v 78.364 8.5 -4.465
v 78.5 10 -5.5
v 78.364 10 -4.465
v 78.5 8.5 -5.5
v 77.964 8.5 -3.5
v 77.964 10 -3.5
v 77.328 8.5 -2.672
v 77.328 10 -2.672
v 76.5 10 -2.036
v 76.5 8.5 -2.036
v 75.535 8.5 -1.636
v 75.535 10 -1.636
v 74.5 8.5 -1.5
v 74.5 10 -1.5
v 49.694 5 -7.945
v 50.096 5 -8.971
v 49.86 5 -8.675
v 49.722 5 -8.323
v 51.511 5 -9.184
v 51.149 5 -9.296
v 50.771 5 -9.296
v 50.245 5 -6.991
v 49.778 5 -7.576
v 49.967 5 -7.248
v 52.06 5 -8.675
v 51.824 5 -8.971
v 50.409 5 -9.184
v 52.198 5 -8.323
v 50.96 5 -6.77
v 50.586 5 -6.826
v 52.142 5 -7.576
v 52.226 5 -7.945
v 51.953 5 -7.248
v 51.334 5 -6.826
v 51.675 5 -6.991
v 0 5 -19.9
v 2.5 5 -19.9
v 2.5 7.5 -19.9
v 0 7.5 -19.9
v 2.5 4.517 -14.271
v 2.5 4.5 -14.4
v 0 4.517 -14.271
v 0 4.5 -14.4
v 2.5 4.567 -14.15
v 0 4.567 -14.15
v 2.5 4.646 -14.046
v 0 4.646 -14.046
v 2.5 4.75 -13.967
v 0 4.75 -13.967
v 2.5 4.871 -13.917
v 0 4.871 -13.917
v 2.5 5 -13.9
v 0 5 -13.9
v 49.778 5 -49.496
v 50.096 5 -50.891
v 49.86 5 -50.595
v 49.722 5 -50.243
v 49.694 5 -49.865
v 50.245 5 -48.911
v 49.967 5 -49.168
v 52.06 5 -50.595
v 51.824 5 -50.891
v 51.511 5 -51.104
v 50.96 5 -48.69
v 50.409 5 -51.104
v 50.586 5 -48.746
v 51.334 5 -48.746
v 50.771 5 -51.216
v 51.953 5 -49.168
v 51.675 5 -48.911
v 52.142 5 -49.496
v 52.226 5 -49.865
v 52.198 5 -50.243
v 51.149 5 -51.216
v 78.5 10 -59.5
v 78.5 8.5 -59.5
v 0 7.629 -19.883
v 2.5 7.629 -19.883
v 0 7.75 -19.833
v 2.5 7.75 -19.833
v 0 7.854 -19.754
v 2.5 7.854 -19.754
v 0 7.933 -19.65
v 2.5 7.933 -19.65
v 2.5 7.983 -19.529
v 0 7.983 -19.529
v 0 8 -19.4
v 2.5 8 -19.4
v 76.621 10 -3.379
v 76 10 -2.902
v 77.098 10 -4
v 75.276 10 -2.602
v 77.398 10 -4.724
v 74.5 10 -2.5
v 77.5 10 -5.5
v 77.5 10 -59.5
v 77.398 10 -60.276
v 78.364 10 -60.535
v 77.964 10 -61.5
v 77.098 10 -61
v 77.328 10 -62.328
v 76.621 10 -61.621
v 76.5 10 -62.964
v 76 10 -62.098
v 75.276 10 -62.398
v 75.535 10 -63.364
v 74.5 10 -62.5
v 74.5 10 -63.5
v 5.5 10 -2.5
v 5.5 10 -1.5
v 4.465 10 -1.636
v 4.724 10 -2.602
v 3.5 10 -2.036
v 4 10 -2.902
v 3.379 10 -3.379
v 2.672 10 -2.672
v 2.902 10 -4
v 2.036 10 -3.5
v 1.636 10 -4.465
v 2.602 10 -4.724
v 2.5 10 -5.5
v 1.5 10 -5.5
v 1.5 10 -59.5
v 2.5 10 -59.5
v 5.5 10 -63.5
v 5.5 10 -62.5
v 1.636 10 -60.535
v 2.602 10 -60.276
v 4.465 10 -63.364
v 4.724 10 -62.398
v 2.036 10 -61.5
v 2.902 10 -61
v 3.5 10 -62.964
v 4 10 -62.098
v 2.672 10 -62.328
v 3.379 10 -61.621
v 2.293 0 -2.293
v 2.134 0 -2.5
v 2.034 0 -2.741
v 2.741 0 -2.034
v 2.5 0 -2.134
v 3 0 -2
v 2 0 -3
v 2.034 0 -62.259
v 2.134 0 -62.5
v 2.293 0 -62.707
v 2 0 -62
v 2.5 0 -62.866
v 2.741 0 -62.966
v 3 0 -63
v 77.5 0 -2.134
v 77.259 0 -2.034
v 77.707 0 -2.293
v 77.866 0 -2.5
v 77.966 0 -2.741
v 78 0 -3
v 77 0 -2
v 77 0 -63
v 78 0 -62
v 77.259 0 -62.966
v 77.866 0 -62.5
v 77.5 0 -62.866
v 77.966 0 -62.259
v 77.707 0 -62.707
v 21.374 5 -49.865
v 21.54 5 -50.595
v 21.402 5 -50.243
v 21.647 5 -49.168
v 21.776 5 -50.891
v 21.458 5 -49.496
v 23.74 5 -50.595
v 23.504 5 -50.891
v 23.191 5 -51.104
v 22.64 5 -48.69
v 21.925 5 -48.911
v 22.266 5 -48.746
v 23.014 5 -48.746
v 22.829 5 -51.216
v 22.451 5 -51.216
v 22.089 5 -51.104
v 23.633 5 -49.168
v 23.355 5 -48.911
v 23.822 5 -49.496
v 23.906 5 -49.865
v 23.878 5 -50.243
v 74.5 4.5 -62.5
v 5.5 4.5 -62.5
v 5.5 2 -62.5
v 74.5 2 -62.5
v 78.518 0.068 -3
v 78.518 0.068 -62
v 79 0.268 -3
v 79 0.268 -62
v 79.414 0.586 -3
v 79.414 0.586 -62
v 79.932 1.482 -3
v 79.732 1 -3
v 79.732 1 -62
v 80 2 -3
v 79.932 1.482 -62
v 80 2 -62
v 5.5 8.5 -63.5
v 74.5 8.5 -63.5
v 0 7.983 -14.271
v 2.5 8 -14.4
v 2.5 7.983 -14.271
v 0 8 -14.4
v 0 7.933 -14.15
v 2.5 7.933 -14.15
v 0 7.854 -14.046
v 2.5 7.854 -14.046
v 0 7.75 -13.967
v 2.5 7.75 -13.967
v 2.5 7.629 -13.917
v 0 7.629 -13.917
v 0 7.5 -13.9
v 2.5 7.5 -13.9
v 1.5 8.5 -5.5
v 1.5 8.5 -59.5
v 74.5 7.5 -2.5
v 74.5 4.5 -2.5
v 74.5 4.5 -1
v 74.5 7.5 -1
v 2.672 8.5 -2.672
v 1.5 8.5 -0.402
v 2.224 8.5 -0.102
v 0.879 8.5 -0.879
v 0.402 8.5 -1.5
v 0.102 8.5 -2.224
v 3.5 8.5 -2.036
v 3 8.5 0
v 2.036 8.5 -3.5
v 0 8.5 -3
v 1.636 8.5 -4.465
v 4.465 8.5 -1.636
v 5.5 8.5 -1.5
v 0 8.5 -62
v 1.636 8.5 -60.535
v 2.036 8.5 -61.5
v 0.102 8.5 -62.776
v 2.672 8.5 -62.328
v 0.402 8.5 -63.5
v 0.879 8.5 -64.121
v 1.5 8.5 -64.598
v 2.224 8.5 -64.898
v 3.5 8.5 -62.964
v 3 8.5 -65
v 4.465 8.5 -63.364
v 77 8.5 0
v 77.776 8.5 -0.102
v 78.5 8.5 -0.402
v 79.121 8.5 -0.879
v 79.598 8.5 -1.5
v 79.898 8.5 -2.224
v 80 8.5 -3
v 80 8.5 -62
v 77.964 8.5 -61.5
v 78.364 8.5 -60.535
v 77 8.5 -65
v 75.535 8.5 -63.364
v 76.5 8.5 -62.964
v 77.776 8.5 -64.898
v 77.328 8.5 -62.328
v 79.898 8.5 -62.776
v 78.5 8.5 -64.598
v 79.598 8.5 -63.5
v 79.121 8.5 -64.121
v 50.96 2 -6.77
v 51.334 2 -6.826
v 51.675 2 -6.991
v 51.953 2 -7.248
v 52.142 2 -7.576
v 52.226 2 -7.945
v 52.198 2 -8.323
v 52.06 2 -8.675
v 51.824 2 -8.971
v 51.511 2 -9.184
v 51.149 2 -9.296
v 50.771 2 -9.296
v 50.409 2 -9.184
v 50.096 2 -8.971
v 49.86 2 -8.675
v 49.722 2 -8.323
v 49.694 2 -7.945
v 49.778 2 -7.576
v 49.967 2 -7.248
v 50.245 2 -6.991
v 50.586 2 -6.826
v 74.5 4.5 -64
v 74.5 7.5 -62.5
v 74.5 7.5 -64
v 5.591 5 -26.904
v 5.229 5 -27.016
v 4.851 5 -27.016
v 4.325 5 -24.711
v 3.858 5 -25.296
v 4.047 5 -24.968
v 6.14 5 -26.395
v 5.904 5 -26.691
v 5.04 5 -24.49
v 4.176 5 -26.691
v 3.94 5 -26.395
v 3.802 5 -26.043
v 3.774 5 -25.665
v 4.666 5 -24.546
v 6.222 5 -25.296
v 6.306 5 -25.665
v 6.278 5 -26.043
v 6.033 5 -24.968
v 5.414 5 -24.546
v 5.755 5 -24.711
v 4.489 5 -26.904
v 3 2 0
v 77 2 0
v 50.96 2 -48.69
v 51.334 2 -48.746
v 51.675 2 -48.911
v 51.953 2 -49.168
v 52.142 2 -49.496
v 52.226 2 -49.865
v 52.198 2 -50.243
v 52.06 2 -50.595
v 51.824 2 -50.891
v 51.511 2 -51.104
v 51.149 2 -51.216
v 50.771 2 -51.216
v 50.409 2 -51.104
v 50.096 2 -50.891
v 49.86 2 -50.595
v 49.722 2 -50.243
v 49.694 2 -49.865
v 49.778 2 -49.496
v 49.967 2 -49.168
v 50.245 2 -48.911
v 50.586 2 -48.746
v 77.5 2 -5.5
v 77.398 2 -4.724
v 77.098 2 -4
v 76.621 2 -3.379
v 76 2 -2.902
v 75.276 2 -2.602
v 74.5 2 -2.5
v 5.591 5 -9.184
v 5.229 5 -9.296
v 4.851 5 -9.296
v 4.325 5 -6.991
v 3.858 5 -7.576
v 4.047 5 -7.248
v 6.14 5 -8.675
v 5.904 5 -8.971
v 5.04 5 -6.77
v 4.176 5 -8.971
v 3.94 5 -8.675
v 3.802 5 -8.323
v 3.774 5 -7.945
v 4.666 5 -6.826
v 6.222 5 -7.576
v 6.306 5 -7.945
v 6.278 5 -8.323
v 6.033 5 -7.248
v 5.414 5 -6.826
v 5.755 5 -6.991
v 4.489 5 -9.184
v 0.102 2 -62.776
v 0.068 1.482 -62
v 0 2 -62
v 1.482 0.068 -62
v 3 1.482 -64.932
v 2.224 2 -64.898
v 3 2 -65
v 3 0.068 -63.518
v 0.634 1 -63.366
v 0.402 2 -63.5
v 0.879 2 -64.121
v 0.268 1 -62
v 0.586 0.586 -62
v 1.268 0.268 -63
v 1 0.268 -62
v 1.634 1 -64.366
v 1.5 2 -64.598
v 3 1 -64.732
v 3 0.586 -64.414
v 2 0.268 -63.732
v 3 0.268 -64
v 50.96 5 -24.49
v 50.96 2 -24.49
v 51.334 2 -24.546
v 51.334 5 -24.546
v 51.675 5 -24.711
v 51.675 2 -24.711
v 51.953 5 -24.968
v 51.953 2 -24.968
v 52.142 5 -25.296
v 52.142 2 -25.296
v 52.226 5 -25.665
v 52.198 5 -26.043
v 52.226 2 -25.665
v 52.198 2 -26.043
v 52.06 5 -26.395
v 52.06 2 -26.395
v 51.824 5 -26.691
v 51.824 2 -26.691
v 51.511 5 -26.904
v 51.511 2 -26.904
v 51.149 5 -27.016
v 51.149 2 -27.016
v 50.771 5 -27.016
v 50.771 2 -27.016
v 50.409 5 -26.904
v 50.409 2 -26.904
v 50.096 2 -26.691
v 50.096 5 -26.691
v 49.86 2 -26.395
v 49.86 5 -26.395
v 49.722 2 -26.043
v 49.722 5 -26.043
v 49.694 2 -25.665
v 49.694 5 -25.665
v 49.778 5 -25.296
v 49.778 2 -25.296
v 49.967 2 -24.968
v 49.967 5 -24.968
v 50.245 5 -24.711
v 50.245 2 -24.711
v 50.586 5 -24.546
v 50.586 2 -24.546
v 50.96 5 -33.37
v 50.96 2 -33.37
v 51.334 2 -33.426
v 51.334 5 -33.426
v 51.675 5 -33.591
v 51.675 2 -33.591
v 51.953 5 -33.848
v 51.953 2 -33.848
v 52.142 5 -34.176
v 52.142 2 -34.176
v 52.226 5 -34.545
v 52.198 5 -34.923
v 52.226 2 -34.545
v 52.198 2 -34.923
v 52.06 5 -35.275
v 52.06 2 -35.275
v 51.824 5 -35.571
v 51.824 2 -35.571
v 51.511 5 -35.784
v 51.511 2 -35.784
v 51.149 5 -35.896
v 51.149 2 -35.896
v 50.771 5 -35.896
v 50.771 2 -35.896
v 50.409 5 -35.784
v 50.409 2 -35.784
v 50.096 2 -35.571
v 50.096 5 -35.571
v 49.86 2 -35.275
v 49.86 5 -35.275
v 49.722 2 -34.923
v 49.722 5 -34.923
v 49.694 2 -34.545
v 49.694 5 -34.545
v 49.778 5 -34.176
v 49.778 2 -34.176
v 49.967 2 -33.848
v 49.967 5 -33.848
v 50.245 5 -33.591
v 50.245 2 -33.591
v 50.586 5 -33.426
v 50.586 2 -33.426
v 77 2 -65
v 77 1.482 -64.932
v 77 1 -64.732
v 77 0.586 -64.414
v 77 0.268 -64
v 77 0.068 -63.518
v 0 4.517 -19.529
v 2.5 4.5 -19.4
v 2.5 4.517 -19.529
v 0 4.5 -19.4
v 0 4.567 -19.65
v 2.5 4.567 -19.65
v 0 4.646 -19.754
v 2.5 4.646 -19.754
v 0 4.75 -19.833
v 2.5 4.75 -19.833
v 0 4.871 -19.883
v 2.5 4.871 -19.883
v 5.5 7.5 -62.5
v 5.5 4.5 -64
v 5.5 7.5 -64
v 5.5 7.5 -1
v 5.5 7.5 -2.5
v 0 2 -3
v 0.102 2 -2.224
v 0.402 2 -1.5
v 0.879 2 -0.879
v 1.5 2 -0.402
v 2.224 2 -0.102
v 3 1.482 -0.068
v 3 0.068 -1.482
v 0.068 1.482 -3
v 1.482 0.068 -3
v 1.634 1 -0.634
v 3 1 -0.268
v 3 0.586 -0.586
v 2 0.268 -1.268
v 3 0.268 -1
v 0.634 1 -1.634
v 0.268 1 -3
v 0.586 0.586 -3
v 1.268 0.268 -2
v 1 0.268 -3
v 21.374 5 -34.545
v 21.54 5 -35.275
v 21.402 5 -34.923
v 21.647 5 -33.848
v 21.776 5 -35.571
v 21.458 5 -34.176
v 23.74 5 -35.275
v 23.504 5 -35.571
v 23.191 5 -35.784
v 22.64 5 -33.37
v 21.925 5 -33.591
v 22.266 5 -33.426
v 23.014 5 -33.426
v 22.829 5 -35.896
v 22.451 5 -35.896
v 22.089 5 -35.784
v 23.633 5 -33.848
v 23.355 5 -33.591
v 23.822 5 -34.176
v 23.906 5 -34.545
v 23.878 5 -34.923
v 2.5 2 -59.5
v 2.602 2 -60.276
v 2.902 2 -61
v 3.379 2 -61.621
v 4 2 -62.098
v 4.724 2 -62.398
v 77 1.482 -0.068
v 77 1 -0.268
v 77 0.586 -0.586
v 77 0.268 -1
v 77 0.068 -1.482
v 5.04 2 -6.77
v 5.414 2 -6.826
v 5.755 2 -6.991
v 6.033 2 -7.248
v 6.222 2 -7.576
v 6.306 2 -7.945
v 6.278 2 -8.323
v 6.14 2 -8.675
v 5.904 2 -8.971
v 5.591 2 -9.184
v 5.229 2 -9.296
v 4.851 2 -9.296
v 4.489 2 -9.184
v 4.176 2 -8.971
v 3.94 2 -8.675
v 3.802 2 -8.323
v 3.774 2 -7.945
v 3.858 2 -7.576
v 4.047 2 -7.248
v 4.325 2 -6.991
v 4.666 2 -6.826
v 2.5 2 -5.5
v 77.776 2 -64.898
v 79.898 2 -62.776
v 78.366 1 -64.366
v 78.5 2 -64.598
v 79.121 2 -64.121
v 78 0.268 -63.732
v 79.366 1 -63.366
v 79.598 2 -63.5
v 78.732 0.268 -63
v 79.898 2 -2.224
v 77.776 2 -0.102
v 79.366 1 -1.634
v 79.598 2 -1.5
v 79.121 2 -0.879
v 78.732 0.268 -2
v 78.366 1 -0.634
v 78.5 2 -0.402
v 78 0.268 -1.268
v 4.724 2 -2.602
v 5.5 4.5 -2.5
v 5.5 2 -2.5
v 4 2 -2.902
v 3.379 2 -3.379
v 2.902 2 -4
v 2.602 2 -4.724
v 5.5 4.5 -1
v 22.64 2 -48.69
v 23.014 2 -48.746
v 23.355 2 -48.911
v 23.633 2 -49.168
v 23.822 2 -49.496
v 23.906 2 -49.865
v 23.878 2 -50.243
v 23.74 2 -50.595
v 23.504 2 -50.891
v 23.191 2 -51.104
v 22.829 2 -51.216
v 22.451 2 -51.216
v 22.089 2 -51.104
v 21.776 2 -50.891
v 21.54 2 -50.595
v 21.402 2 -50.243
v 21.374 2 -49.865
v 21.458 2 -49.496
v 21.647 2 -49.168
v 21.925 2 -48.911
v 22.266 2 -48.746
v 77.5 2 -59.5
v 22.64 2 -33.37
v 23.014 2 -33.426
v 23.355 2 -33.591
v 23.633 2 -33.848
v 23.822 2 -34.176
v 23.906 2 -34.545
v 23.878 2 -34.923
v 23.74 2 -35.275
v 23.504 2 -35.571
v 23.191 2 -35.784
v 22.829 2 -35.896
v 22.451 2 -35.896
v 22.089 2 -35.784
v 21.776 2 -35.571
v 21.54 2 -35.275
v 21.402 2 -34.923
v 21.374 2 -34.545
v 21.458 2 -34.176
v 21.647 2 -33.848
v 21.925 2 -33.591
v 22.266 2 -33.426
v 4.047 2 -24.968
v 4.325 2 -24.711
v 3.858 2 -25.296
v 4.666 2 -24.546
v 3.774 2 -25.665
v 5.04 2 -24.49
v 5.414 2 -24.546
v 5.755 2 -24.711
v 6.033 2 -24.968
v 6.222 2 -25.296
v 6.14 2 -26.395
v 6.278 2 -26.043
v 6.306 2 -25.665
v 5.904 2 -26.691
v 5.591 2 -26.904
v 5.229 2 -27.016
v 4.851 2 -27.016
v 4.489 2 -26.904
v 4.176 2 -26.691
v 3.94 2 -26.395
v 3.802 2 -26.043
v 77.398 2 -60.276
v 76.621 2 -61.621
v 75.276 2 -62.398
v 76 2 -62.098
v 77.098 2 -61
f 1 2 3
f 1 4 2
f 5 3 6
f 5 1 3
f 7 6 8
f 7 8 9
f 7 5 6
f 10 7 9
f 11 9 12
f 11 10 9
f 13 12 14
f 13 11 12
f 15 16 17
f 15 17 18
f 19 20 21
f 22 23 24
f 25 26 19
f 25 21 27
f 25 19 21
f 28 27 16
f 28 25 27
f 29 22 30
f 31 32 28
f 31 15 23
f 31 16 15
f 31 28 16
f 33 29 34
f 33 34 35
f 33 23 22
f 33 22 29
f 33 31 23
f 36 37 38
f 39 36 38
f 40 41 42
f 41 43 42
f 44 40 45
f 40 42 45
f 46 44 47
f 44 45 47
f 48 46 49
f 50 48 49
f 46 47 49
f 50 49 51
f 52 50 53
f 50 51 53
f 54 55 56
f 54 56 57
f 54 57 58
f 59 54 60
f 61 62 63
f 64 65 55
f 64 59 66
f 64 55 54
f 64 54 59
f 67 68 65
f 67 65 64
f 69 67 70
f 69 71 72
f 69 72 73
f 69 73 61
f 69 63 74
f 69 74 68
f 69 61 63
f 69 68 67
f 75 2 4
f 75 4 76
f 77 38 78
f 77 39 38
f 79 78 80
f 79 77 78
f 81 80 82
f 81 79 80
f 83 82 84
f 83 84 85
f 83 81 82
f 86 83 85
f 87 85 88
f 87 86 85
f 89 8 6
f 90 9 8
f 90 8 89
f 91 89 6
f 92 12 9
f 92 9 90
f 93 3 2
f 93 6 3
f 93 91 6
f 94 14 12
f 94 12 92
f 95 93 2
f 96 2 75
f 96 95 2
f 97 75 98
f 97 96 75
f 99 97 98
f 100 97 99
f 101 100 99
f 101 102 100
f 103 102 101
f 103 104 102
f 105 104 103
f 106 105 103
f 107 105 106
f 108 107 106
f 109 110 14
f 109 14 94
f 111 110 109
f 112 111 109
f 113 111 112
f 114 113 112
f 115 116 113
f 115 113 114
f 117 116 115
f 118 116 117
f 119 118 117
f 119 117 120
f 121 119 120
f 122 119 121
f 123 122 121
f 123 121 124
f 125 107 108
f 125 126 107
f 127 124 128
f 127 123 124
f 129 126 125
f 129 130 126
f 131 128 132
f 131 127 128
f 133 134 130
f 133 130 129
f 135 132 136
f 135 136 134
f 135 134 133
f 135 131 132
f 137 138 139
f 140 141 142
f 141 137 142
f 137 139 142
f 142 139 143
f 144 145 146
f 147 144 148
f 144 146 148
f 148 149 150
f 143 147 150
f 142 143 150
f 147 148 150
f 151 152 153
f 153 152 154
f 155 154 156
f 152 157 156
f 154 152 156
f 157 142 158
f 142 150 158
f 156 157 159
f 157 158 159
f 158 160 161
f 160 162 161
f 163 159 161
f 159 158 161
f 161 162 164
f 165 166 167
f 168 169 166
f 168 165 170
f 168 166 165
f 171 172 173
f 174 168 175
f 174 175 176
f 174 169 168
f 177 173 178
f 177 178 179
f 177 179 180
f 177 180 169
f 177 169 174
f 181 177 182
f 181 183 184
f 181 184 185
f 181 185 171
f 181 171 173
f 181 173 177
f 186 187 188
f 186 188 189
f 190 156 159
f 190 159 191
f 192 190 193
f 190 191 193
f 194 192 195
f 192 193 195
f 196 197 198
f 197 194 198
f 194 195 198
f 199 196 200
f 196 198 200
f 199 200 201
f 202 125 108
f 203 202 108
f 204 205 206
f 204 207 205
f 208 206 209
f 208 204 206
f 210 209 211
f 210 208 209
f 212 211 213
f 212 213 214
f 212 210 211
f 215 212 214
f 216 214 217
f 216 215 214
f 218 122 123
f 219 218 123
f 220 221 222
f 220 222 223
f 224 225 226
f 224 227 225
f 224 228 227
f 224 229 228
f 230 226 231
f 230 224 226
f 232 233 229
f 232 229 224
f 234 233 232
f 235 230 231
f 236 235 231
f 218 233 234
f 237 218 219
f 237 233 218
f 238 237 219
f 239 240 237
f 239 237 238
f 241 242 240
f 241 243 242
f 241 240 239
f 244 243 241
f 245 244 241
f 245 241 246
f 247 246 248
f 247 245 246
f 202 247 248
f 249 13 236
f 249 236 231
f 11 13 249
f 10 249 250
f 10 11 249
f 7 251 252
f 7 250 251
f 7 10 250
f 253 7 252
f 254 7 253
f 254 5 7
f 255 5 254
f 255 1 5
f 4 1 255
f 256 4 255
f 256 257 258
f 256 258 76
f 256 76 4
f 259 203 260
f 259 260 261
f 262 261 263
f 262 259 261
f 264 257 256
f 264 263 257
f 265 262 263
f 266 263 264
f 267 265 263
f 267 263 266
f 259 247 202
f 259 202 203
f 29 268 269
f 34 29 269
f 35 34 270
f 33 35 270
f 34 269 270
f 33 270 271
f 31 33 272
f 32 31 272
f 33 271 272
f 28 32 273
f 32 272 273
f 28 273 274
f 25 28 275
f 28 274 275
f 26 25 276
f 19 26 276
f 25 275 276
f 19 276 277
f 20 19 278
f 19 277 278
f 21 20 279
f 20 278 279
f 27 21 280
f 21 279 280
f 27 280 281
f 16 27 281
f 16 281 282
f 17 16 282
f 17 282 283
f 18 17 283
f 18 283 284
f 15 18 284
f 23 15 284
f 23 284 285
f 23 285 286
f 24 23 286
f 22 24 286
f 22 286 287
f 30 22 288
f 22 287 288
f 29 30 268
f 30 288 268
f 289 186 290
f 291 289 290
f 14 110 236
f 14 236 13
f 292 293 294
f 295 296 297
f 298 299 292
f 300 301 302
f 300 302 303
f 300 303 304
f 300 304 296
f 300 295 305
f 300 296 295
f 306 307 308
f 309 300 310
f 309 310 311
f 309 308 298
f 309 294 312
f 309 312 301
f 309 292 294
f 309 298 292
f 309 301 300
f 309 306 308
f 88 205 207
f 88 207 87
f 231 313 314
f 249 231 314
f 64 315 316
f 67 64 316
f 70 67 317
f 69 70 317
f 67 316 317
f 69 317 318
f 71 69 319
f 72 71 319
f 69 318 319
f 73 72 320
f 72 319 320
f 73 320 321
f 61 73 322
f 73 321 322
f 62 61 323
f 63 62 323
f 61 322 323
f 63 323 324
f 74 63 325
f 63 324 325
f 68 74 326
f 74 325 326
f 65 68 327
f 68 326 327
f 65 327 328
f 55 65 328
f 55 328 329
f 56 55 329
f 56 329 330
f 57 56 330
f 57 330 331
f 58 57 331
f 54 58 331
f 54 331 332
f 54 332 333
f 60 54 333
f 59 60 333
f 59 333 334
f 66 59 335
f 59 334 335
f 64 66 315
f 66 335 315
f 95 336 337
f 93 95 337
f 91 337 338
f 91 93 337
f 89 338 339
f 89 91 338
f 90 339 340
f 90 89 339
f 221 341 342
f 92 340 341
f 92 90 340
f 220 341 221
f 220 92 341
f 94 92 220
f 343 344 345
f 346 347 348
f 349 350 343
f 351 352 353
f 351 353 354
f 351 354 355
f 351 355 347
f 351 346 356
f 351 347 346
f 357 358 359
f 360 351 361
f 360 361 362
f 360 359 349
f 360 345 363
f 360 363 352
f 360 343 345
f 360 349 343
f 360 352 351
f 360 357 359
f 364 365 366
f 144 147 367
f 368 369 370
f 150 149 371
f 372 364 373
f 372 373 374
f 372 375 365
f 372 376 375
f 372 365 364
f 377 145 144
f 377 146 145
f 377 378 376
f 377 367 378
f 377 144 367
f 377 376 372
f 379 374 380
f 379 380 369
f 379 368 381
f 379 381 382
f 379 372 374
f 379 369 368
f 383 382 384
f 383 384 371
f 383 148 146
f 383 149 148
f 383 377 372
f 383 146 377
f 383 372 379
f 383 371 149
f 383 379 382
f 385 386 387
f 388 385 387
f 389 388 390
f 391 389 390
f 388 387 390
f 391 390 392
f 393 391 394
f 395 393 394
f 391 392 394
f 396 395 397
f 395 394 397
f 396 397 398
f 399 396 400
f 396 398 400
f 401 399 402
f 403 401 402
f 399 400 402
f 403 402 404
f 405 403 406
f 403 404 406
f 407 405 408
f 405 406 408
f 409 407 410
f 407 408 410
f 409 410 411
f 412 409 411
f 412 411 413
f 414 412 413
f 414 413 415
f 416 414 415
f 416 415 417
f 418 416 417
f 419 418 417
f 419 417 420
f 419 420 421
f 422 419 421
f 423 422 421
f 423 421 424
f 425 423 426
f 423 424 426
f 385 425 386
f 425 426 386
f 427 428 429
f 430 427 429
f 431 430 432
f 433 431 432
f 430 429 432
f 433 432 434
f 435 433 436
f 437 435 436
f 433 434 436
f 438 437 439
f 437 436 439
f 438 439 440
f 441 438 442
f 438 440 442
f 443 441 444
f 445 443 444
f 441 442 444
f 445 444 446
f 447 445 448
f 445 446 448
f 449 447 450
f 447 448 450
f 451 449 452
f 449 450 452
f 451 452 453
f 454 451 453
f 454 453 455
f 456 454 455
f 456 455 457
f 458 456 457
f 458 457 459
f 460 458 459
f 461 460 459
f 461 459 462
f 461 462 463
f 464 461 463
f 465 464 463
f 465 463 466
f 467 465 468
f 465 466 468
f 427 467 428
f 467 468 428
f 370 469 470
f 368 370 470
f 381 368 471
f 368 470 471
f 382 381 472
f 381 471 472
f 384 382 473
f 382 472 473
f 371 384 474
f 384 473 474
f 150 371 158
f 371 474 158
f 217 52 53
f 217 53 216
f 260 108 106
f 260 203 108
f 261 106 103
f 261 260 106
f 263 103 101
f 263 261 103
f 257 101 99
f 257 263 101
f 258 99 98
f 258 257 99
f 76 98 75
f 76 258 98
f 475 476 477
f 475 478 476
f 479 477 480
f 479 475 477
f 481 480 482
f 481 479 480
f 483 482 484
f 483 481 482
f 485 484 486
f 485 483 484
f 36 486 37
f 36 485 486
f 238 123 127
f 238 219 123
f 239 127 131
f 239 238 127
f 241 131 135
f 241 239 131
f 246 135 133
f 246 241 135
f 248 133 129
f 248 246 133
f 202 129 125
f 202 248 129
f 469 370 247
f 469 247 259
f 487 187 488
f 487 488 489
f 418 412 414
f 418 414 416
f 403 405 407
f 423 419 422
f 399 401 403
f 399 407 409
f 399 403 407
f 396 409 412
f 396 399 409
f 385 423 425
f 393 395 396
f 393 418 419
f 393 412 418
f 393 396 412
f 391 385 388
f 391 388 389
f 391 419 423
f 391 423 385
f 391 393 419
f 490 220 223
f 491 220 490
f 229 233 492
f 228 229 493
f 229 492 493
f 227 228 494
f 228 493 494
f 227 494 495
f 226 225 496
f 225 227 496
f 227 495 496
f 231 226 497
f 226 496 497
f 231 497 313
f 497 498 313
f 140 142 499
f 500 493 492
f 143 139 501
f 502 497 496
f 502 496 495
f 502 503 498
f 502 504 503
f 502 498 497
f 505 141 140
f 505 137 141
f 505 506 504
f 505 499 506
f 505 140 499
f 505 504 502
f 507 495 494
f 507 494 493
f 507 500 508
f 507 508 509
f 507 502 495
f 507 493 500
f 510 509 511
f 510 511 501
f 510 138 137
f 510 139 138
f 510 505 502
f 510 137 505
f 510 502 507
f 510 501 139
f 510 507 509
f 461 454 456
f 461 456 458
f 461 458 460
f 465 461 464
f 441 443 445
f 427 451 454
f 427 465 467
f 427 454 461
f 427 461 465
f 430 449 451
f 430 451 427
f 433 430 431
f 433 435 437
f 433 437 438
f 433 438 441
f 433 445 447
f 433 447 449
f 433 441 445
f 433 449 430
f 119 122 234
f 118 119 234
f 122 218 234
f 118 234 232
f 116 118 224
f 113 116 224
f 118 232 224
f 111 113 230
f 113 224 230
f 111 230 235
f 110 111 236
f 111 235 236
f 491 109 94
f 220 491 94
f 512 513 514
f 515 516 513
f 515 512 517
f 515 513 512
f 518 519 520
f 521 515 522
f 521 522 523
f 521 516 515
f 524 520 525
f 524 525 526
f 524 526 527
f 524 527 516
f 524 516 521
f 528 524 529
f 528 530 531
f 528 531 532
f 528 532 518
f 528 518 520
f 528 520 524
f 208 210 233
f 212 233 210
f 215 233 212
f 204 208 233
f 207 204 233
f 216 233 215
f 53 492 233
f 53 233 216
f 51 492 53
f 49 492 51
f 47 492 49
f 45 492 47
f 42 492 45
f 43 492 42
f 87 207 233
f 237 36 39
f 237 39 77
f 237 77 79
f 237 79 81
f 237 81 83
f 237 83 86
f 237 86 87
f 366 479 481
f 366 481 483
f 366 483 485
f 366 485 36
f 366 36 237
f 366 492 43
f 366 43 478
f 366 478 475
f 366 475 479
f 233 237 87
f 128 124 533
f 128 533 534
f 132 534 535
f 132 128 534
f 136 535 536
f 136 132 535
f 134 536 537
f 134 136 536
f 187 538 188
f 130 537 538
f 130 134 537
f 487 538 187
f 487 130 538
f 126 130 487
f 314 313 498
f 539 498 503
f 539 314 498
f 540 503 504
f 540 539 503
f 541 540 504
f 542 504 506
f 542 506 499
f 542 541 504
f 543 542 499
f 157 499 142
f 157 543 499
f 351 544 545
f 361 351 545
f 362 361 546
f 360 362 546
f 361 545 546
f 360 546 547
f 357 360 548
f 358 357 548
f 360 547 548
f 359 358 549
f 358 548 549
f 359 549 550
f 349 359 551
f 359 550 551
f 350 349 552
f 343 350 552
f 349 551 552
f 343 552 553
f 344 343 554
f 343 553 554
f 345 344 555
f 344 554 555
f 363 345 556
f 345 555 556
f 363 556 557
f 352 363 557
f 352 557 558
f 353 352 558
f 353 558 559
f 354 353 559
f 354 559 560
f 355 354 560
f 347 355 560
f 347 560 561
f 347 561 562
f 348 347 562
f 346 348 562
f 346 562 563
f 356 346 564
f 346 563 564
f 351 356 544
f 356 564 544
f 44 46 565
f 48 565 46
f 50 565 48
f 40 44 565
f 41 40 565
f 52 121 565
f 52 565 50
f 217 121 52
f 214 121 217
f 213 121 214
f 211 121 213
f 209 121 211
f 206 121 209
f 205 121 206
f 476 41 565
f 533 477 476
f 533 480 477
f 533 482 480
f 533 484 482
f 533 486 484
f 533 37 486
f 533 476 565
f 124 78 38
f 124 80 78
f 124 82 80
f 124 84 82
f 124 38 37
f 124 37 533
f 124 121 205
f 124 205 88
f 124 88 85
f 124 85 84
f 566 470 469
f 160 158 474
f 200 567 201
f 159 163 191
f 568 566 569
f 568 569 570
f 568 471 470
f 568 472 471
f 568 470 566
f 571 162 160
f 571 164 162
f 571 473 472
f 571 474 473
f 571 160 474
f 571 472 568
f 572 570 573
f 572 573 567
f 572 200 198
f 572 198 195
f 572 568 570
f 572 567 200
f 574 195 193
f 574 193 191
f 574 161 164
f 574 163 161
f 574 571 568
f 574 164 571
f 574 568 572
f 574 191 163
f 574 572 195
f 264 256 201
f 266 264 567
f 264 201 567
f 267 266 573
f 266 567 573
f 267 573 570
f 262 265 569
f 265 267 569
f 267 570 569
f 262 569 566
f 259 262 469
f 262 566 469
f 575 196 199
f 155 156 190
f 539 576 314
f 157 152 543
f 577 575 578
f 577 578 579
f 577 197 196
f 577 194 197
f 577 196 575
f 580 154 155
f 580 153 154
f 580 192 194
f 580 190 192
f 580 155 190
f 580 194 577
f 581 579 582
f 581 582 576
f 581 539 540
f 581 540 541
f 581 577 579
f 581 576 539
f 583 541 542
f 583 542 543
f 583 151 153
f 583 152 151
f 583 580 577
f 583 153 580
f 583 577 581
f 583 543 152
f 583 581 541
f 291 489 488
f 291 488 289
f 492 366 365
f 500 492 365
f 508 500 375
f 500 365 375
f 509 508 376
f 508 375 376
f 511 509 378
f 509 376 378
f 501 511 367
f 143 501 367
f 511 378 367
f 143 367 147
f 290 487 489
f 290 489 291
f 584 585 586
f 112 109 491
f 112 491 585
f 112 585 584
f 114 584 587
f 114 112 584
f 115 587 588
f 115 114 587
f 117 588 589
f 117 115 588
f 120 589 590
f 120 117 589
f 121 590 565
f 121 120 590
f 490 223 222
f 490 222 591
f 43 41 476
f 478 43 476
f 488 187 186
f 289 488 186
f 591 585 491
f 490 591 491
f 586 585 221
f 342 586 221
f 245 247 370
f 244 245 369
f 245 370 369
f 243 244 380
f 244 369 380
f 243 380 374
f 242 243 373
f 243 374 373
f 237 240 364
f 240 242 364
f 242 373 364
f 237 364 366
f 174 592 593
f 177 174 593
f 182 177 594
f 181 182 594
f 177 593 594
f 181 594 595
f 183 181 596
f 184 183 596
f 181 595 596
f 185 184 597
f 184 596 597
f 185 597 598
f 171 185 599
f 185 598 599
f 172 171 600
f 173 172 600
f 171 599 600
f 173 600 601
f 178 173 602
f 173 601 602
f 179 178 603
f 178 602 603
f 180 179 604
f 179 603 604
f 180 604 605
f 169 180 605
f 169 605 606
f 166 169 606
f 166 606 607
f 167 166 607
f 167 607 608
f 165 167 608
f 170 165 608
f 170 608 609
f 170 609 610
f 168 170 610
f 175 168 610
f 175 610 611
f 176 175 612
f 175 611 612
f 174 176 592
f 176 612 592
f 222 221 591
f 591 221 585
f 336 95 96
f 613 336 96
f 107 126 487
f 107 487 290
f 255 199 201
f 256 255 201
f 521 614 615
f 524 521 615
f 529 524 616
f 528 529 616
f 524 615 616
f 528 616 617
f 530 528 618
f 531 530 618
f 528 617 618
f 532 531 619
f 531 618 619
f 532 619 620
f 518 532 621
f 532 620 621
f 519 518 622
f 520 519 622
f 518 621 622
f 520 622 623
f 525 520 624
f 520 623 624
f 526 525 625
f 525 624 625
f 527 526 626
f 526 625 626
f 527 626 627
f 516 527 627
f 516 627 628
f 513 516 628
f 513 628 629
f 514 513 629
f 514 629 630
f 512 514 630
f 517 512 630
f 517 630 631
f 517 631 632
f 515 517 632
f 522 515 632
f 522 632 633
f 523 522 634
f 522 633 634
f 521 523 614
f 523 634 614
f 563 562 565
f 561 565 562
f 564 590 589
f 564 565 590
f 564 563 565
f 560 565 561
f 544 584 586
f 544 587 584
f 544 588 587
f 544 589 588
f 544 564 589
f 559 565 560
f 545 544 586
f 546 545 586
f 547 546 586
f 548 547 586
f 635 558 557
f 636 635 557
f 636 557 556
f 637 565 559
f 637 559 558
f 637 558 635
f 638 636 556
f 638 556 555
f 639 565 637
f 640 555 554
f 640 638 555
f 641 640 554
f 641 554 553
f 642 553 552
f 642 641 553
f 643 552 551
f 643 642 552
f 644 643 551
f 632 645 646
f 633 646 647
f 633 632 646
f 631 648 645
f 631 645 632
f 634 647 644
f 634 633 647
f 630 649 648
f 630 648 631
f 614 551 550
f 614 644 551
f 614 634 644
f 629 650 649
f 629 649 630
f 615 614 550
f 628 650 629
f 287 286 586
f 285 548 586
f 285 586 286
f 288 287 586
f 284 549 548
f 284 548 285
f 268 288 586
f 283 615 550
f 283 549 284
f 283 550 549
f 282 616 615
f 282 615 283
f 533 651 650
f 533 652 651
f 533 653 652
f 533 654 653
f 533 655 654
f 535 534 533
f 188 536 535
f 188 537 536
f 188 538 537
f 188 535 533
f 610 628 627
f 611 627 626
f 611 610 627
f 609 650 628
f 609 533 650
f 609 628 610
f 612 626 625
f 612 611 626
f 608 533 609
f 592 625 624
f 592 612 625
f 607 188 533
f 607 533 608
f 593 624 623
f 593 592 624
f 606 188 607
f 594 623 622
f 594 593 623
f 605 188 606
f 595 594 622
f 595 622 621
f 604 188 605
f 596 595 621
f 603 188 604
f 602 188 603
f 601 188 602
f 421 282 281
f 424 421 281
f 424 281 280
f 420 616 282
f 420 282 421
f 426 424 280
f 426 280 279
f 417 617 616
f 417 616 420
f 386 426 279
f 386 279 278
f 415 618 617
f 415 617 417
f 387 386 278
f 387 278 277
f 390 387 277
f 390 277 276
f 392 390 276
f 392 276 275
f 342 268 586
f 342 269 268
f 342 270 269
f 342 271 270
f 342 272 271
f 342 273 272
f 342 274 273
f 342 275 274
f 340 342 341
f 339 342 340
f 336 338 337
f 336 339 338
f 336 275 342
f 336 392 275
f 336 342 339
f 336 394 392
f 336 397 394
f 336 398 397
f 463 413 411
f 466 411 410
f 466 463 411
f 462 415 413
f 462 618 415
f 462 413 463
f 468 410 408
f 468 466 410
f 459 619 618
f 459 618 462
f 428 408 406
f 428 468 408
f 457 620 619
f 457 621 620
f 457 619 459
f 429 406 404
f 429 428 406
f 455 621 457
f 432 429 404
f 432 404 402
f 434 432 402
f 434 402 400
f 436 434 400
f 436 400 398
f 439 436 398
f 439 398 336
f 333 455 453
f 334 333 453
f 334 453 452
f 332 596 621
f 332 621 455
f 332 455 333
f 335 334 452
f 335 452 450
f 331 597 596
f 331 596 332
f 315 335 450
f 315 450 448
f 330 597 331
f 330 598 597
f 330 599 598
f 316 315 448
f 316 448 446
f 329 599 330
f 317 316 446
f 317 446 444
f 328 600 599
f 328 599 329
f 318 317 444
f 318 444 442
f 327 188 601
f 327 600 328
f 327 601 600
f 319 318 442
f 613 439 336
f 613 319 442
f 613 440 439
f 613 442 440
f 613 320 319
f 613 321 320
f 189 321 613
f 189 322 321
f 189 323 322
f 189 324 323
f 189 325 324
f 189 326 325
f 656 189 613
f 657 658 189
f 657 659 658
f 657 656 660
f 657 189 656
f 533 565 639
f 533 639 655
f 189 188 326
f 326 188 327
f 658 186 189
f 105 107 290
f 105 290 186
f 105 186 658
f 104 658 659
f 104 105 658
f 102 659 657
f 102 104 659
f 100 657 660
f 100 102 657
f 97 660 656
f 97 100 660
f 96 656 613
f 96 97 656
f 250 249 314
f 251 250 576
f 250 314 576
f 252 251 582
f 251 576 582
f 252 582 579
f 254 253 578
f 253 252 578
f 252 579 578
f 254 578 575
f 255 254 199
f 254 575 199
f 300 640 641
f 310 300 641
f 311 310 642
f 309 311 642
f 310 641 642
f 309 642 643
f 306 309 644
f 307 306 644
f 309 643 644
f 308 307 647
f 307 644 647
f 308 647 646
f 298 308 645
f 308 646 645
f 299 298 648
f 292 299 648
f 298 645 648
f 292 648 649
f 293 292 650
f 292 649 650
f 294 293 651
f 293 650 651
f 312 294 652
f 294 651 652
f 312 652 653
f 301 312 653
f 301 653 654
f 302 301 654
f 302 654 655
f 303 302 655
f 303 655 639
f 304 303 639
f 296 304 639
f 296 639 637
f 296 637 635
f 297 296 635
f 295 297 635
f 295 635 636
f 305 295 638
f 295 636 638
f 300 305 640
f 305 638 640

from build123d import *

# Parameters (mm, degrees)
SKETCH1_W           = 80
SKETCH1_H           = 65
BOSS_EXTRUDE1_DEPTH = 10
SKETCH2_W           = 75
SKETCH2_H           = 60
CUT_EXTRUDE1_DEPTH  = 8
FILLET4_R           = 2
FILLET5_R           = 3
SKETCH3_W           = 80
SKETCH3_H           = 65
SKETCH3_W_2         = 77
SKETCH3_H_2         = 62
CUT_EXTRUDE2_DEPTH  = 1.5
FILLET7_R           = 4
SKETCH4_R           = 1.27
BOSS_EXTRUDE2_DEPTH = 3
SKETCH5_W           = 6
SKETCH5_H           = 3.5
CUT_EXTRUDE3_DEPTH  = 102.642756751
FILLET8_R           = 0.5
SKETCH8_W           = 69
SKETCH8_H           = 3
CUT_EXTRUDE4_DEPTH  = 1.5
SKETCH9_W           = 69
SKETCH9_H           = 3
CUT_EXTRUDE5_DEPTH  = 1.5


with BuildPart() as part:
    # Sketch1 → Boss-Extrude1 (new body)
    with BuildSketch(Plane(origin=(0, 0, 0), x_dir=(1, 0, 0), z_dir=(0, 1, 0))):
        with Locations((40, 32.5)):
            Rectangle(SKETCH1_W, SKETCH1_H)
    extrude(amount=BOSS_EXTRUDE1_DEPTH)

    # Sketch2 → Cut-Extrude1 (cut)
    with BuildSketch(Plane(origin=(0, 10, 0), x_dir=(1, 0, 0), z_dir=(0, 1, 0))):
        with Locations((40, 32.5)):
            Rectangle(SKETCH2_W, SKETCH2_H)
    extrude(amount=-CUT_EXTRUDE1_DEPTH, mode=Mode.SUBTRACT)

    # Fillet4
    fillet4_edges = [part.edges().sort_by_distance(p)[0] for p in [
        (40, 0, -65),
        (80, 0, -32.5),
        (40, 0, 0),
        (0, 0, -32.5),
    ]]
    fillet(fillet4_edges, radius=FILLET4_R)

    # Fillet5
    # the kernel refuses this fillet: 3 mm, written as the material it adds along each edge
    with BuildSketch(Plane(origin=(2.5, 10, -2.5), x_dir=(0, 0, -1), z_dir=(0, -1, 0)), Plane(origin=(77.5, 10, -62.5), x_dir=(0, 0, 1), z_dir=(0, -1, 0)), Plane(origin=(77.5, 10, -2.5), x_dir=(-1, 0, 0), z_dir=(0, -1, 0))) as fillet5_piece_1:
        with BuildLine():
            CenterArc((FILLET5_R, FILLET5_R), FILLET5_R, 180, 90)
            Line((0, FILLET5_R), (0, 0))
            Line((0, 0), (FILLET5_R, 0))
        make_face()
    extrude(amount=8)
    with BuildSketch(Plane(origin=(2.5, 10, -62.5), x_dir=(0, 0, 1), z_dir=(0, -1, 0))) as fillet5_piece_2:
        with BuildLine():
            CenterArc((FILLET5_R, -FILLET5_R), FILLET5_R, 90, 90)
            Line((0, -FILLET5_R), (0, 0))
            Line((0, 0), (FILLET5_R, 0))
        make_face()
    extrude(amount=8)
    # the kernel refuses this fillet: 3 mm, written as the material it takes off along each edge
    with BuildSketch(Plane(origin=(77, 0, -62), x_dir=(0, 0, -1), z_dir=(-1, 0, 0))) as fillet5_2_piece_1:
        with BuildLine():
            CenterArc((1, -2), 2, 0, 90)
            Line((3, -2), (3, 0))
            Line((3, 0), (1, 0))
        make_face()
    revolve(axis=Axis((77, 0, -62), (0, -1, 0)), revolution_arc=90, mode=Mode.SUBTRACT)
    with BuildSketch(Plane(origin=(77, 0, -3), x_dir=(1, 0, 0), z_dir=(0, 0, -1))) as fillet5_2_piece_2:
        with BuildLine():
            CenterArc((1, -2), 2, 0, 90)
            Line((3, -2), (3, 0))
            Line((3, 0), (1, 0))
        make_face()
    revolve(axis=Axis((77, 0, -3), (0, -1, 0)), revolution_arc=90, mode=Mode.SUBTRACT)
    with BuildSketch(Plane(origin=(3, 0, -62), x_dir=(-1, 0, 0), z_dir=(0, 0, 1))) as fillet5_2_piece_3:
        with BuildLine():
            CenterArc((1, -2), 2, 0, 90)
            Line((3, -2), (3, 0))
            Line((3, 0), (1, 0))
        make_face()
    revolve(axis=Axis((3, 0, -62), (0, -1, 0)), revolution_arc=90, mode=Mode.SUBTRACT)
    with BuildSketch(Plane(origin=(3, 0, -3), x_dir=(0, 0, 1), z_dir=(1, 0, 0))) as fillet5_2_piece_4:
        with BuildLine():
            CenterArc((1, -2), 2, 0, 90)
            Line((3, -2), (3, 0))
            Line((3, 0), (1, 0))
        make_face()
    revolve(axis=Axis((3, 0, -3), (0, -1, 0)), revolution_arc=90, mode=Mode.SUBTRACT)
    with BuildSketch(Plane(origin=(0, 0, -65), x_dir=(0, 0, 1), z_dir=(0, 1, 0)), Plane(origin=(0, 0, 0), x_dir=(1, 0, 0), z_dir=(0, 1, 0))) as fillet5_2_piece_5:
        with BuildLine():
            CenterArc((FILLET5_R, FILLET5_R), FILLET5_R, 180, 90)
            Line((0, FILLET5_R), (0, 0))
            Line((0, 0), (FILLET5_R, 0))
        make_face()
    extrude(amount=17.5, mode=Mode.SUBTRACT)
    with BuildSketch(Plane(origin=(80, 0, -65), x_dir=(0, 0, 1), z_dir=(0, 1, 0)), Plane(origin=(80, 0, 0), x_dir=(-1, 0, 0), z_dir=(0, 1, 0))) as fillet5_2_piece_6:
        with BuildLine():
            CenterArc((FILLET5_R, -FILLET5_R), FILLET5_R, 90, 90)
            Line((0, -FILLET5_R), (0, 0))
            Line((0, 0), (FILLET5_R, 0))
        make_face()
    extrude(amount=17.5, mode=Mode.SUBTRACT)

    # Sketch3 → Cut-Extrude2 (cut)
    with BuildSketch(Plane(origin=(0, 10, 0), x_dir=(1, 0, 0), z_dir=(0, 1, 0))):
        with Locations((40, 32.5)):
            Rectangle(SKETCH3_W, SKETCH3_H)
        with Locations((40, 32.5)):
            Rectangle(SKETCH3_W_2, SKETCH3_H_2, mode=Mode.SUBTRACT)
    extrude(amount=-CUT_EXTRUDE2_DEPTH, mode=Mode.SUBTRACT)

    # Fillet7
    fillet7_edges = [part.edges().sort_by_distance(p)[0] for p in [
        (78.5, 9.25, -63.5),
        (78.5, 9.25, -1.5),
        (1.5, 9.25, -1.5),
        (1.5, 9.25, -63.5),
    ]]
    fillet(fillet7_edges, radius=FILLET7_R)

    # Sketch4 → Boss-Extrude2 (add)
    with BuildSketch(Plane(origin=(0, 2, 0), x_dir=(1, 0, 0), z_dir=(0, 1, 0))):
        with Locations(Location((5.04, 8.04, 0), (0, 0, 270))):
            Circle(SKETCH4_R)
        with Locations(Location((5.04, 25.76, 0), (0, 0, 270))):
            Circle(SKETCH4_R)
        with Locations(Location((22.64, 34.64, 0), (0, 0, 270))):
            Circle(SKETCH4_R)
        with Locations(Location((22.64, 49.96, 0), (0, 0, 270))):
            Circle(SKETCH4_R)
        with Locations(Location((50.96, 8.04, 0), (0, 0, 270))):
            Circle(SKETCH4_R)
        with Locations(Location((50.96, 25.76, 0), (0, 0, 270))):
            Circle(SKETCH4_R)
        with Locations(Location((50.96, 34.64, 0), (0, 0, 270))):
            Circle(SKETCH4_R)
        with Locations(Location((50.96, 49.96, 0), (0, 0, 270))):
            Circle(SKETCH4_R)
    extrude(amount=BOSS_EXTRUDE2_DEPTH)

    # Sketch5 → Cut-Extrude3 (cut, through all)
    with BuildSketch(Plane(origin=(2.5, 0, 0), x_dir=(0, 0, -1), z_dir=(1, 0, 0))):
        with Locations((16.9, 6.25)):
            Rectangle(SKETCH5_W, SKETCH5_H)
    extrude(amount=-CUT_EXTRUDE3_DEPTH, mode=Mode.SUBTRACT)

    # Fillet8
    fillet8_edges = [part.edges().sort_by_distance(p)[0] for p in [
        (1.25, 4.5, -19.9),
        (1.25, 4.5, -13.9),
        (1.25, 8, -13.9),
        (1.25, 8, -19.9),
    ]]
    fillet(fillet8_edges, radius=FILLET8_R)

    # Sketch8 → Cut-Extrude4 (cut)
    with BuildSketch(Plane.XY.offset(-62.5)):
        with Locations((40, 6)):
            Rectangle(SKETCH8_W, SKETCH8_H)
    extrude(amount=-CUT_EXTRUDE4_DEPTH, mode=Mode.SUBTRACT)

    # Sketch9 → Cut-Extrude5 (cut)
    with BuildSketch(Plane(origin=(0, 0, -2.5), x_dir=(-1, 0, 0), z_dir=(0, 0, -1))):
        with Locations((-40, 6)):
            Rectangle(SKETCH9_W, SKETCH9_H)
    extrude(amount=-CUT_EXTRUDE5_DEPTH, mode=Mode.SUBTRACT)


solid = part.part
